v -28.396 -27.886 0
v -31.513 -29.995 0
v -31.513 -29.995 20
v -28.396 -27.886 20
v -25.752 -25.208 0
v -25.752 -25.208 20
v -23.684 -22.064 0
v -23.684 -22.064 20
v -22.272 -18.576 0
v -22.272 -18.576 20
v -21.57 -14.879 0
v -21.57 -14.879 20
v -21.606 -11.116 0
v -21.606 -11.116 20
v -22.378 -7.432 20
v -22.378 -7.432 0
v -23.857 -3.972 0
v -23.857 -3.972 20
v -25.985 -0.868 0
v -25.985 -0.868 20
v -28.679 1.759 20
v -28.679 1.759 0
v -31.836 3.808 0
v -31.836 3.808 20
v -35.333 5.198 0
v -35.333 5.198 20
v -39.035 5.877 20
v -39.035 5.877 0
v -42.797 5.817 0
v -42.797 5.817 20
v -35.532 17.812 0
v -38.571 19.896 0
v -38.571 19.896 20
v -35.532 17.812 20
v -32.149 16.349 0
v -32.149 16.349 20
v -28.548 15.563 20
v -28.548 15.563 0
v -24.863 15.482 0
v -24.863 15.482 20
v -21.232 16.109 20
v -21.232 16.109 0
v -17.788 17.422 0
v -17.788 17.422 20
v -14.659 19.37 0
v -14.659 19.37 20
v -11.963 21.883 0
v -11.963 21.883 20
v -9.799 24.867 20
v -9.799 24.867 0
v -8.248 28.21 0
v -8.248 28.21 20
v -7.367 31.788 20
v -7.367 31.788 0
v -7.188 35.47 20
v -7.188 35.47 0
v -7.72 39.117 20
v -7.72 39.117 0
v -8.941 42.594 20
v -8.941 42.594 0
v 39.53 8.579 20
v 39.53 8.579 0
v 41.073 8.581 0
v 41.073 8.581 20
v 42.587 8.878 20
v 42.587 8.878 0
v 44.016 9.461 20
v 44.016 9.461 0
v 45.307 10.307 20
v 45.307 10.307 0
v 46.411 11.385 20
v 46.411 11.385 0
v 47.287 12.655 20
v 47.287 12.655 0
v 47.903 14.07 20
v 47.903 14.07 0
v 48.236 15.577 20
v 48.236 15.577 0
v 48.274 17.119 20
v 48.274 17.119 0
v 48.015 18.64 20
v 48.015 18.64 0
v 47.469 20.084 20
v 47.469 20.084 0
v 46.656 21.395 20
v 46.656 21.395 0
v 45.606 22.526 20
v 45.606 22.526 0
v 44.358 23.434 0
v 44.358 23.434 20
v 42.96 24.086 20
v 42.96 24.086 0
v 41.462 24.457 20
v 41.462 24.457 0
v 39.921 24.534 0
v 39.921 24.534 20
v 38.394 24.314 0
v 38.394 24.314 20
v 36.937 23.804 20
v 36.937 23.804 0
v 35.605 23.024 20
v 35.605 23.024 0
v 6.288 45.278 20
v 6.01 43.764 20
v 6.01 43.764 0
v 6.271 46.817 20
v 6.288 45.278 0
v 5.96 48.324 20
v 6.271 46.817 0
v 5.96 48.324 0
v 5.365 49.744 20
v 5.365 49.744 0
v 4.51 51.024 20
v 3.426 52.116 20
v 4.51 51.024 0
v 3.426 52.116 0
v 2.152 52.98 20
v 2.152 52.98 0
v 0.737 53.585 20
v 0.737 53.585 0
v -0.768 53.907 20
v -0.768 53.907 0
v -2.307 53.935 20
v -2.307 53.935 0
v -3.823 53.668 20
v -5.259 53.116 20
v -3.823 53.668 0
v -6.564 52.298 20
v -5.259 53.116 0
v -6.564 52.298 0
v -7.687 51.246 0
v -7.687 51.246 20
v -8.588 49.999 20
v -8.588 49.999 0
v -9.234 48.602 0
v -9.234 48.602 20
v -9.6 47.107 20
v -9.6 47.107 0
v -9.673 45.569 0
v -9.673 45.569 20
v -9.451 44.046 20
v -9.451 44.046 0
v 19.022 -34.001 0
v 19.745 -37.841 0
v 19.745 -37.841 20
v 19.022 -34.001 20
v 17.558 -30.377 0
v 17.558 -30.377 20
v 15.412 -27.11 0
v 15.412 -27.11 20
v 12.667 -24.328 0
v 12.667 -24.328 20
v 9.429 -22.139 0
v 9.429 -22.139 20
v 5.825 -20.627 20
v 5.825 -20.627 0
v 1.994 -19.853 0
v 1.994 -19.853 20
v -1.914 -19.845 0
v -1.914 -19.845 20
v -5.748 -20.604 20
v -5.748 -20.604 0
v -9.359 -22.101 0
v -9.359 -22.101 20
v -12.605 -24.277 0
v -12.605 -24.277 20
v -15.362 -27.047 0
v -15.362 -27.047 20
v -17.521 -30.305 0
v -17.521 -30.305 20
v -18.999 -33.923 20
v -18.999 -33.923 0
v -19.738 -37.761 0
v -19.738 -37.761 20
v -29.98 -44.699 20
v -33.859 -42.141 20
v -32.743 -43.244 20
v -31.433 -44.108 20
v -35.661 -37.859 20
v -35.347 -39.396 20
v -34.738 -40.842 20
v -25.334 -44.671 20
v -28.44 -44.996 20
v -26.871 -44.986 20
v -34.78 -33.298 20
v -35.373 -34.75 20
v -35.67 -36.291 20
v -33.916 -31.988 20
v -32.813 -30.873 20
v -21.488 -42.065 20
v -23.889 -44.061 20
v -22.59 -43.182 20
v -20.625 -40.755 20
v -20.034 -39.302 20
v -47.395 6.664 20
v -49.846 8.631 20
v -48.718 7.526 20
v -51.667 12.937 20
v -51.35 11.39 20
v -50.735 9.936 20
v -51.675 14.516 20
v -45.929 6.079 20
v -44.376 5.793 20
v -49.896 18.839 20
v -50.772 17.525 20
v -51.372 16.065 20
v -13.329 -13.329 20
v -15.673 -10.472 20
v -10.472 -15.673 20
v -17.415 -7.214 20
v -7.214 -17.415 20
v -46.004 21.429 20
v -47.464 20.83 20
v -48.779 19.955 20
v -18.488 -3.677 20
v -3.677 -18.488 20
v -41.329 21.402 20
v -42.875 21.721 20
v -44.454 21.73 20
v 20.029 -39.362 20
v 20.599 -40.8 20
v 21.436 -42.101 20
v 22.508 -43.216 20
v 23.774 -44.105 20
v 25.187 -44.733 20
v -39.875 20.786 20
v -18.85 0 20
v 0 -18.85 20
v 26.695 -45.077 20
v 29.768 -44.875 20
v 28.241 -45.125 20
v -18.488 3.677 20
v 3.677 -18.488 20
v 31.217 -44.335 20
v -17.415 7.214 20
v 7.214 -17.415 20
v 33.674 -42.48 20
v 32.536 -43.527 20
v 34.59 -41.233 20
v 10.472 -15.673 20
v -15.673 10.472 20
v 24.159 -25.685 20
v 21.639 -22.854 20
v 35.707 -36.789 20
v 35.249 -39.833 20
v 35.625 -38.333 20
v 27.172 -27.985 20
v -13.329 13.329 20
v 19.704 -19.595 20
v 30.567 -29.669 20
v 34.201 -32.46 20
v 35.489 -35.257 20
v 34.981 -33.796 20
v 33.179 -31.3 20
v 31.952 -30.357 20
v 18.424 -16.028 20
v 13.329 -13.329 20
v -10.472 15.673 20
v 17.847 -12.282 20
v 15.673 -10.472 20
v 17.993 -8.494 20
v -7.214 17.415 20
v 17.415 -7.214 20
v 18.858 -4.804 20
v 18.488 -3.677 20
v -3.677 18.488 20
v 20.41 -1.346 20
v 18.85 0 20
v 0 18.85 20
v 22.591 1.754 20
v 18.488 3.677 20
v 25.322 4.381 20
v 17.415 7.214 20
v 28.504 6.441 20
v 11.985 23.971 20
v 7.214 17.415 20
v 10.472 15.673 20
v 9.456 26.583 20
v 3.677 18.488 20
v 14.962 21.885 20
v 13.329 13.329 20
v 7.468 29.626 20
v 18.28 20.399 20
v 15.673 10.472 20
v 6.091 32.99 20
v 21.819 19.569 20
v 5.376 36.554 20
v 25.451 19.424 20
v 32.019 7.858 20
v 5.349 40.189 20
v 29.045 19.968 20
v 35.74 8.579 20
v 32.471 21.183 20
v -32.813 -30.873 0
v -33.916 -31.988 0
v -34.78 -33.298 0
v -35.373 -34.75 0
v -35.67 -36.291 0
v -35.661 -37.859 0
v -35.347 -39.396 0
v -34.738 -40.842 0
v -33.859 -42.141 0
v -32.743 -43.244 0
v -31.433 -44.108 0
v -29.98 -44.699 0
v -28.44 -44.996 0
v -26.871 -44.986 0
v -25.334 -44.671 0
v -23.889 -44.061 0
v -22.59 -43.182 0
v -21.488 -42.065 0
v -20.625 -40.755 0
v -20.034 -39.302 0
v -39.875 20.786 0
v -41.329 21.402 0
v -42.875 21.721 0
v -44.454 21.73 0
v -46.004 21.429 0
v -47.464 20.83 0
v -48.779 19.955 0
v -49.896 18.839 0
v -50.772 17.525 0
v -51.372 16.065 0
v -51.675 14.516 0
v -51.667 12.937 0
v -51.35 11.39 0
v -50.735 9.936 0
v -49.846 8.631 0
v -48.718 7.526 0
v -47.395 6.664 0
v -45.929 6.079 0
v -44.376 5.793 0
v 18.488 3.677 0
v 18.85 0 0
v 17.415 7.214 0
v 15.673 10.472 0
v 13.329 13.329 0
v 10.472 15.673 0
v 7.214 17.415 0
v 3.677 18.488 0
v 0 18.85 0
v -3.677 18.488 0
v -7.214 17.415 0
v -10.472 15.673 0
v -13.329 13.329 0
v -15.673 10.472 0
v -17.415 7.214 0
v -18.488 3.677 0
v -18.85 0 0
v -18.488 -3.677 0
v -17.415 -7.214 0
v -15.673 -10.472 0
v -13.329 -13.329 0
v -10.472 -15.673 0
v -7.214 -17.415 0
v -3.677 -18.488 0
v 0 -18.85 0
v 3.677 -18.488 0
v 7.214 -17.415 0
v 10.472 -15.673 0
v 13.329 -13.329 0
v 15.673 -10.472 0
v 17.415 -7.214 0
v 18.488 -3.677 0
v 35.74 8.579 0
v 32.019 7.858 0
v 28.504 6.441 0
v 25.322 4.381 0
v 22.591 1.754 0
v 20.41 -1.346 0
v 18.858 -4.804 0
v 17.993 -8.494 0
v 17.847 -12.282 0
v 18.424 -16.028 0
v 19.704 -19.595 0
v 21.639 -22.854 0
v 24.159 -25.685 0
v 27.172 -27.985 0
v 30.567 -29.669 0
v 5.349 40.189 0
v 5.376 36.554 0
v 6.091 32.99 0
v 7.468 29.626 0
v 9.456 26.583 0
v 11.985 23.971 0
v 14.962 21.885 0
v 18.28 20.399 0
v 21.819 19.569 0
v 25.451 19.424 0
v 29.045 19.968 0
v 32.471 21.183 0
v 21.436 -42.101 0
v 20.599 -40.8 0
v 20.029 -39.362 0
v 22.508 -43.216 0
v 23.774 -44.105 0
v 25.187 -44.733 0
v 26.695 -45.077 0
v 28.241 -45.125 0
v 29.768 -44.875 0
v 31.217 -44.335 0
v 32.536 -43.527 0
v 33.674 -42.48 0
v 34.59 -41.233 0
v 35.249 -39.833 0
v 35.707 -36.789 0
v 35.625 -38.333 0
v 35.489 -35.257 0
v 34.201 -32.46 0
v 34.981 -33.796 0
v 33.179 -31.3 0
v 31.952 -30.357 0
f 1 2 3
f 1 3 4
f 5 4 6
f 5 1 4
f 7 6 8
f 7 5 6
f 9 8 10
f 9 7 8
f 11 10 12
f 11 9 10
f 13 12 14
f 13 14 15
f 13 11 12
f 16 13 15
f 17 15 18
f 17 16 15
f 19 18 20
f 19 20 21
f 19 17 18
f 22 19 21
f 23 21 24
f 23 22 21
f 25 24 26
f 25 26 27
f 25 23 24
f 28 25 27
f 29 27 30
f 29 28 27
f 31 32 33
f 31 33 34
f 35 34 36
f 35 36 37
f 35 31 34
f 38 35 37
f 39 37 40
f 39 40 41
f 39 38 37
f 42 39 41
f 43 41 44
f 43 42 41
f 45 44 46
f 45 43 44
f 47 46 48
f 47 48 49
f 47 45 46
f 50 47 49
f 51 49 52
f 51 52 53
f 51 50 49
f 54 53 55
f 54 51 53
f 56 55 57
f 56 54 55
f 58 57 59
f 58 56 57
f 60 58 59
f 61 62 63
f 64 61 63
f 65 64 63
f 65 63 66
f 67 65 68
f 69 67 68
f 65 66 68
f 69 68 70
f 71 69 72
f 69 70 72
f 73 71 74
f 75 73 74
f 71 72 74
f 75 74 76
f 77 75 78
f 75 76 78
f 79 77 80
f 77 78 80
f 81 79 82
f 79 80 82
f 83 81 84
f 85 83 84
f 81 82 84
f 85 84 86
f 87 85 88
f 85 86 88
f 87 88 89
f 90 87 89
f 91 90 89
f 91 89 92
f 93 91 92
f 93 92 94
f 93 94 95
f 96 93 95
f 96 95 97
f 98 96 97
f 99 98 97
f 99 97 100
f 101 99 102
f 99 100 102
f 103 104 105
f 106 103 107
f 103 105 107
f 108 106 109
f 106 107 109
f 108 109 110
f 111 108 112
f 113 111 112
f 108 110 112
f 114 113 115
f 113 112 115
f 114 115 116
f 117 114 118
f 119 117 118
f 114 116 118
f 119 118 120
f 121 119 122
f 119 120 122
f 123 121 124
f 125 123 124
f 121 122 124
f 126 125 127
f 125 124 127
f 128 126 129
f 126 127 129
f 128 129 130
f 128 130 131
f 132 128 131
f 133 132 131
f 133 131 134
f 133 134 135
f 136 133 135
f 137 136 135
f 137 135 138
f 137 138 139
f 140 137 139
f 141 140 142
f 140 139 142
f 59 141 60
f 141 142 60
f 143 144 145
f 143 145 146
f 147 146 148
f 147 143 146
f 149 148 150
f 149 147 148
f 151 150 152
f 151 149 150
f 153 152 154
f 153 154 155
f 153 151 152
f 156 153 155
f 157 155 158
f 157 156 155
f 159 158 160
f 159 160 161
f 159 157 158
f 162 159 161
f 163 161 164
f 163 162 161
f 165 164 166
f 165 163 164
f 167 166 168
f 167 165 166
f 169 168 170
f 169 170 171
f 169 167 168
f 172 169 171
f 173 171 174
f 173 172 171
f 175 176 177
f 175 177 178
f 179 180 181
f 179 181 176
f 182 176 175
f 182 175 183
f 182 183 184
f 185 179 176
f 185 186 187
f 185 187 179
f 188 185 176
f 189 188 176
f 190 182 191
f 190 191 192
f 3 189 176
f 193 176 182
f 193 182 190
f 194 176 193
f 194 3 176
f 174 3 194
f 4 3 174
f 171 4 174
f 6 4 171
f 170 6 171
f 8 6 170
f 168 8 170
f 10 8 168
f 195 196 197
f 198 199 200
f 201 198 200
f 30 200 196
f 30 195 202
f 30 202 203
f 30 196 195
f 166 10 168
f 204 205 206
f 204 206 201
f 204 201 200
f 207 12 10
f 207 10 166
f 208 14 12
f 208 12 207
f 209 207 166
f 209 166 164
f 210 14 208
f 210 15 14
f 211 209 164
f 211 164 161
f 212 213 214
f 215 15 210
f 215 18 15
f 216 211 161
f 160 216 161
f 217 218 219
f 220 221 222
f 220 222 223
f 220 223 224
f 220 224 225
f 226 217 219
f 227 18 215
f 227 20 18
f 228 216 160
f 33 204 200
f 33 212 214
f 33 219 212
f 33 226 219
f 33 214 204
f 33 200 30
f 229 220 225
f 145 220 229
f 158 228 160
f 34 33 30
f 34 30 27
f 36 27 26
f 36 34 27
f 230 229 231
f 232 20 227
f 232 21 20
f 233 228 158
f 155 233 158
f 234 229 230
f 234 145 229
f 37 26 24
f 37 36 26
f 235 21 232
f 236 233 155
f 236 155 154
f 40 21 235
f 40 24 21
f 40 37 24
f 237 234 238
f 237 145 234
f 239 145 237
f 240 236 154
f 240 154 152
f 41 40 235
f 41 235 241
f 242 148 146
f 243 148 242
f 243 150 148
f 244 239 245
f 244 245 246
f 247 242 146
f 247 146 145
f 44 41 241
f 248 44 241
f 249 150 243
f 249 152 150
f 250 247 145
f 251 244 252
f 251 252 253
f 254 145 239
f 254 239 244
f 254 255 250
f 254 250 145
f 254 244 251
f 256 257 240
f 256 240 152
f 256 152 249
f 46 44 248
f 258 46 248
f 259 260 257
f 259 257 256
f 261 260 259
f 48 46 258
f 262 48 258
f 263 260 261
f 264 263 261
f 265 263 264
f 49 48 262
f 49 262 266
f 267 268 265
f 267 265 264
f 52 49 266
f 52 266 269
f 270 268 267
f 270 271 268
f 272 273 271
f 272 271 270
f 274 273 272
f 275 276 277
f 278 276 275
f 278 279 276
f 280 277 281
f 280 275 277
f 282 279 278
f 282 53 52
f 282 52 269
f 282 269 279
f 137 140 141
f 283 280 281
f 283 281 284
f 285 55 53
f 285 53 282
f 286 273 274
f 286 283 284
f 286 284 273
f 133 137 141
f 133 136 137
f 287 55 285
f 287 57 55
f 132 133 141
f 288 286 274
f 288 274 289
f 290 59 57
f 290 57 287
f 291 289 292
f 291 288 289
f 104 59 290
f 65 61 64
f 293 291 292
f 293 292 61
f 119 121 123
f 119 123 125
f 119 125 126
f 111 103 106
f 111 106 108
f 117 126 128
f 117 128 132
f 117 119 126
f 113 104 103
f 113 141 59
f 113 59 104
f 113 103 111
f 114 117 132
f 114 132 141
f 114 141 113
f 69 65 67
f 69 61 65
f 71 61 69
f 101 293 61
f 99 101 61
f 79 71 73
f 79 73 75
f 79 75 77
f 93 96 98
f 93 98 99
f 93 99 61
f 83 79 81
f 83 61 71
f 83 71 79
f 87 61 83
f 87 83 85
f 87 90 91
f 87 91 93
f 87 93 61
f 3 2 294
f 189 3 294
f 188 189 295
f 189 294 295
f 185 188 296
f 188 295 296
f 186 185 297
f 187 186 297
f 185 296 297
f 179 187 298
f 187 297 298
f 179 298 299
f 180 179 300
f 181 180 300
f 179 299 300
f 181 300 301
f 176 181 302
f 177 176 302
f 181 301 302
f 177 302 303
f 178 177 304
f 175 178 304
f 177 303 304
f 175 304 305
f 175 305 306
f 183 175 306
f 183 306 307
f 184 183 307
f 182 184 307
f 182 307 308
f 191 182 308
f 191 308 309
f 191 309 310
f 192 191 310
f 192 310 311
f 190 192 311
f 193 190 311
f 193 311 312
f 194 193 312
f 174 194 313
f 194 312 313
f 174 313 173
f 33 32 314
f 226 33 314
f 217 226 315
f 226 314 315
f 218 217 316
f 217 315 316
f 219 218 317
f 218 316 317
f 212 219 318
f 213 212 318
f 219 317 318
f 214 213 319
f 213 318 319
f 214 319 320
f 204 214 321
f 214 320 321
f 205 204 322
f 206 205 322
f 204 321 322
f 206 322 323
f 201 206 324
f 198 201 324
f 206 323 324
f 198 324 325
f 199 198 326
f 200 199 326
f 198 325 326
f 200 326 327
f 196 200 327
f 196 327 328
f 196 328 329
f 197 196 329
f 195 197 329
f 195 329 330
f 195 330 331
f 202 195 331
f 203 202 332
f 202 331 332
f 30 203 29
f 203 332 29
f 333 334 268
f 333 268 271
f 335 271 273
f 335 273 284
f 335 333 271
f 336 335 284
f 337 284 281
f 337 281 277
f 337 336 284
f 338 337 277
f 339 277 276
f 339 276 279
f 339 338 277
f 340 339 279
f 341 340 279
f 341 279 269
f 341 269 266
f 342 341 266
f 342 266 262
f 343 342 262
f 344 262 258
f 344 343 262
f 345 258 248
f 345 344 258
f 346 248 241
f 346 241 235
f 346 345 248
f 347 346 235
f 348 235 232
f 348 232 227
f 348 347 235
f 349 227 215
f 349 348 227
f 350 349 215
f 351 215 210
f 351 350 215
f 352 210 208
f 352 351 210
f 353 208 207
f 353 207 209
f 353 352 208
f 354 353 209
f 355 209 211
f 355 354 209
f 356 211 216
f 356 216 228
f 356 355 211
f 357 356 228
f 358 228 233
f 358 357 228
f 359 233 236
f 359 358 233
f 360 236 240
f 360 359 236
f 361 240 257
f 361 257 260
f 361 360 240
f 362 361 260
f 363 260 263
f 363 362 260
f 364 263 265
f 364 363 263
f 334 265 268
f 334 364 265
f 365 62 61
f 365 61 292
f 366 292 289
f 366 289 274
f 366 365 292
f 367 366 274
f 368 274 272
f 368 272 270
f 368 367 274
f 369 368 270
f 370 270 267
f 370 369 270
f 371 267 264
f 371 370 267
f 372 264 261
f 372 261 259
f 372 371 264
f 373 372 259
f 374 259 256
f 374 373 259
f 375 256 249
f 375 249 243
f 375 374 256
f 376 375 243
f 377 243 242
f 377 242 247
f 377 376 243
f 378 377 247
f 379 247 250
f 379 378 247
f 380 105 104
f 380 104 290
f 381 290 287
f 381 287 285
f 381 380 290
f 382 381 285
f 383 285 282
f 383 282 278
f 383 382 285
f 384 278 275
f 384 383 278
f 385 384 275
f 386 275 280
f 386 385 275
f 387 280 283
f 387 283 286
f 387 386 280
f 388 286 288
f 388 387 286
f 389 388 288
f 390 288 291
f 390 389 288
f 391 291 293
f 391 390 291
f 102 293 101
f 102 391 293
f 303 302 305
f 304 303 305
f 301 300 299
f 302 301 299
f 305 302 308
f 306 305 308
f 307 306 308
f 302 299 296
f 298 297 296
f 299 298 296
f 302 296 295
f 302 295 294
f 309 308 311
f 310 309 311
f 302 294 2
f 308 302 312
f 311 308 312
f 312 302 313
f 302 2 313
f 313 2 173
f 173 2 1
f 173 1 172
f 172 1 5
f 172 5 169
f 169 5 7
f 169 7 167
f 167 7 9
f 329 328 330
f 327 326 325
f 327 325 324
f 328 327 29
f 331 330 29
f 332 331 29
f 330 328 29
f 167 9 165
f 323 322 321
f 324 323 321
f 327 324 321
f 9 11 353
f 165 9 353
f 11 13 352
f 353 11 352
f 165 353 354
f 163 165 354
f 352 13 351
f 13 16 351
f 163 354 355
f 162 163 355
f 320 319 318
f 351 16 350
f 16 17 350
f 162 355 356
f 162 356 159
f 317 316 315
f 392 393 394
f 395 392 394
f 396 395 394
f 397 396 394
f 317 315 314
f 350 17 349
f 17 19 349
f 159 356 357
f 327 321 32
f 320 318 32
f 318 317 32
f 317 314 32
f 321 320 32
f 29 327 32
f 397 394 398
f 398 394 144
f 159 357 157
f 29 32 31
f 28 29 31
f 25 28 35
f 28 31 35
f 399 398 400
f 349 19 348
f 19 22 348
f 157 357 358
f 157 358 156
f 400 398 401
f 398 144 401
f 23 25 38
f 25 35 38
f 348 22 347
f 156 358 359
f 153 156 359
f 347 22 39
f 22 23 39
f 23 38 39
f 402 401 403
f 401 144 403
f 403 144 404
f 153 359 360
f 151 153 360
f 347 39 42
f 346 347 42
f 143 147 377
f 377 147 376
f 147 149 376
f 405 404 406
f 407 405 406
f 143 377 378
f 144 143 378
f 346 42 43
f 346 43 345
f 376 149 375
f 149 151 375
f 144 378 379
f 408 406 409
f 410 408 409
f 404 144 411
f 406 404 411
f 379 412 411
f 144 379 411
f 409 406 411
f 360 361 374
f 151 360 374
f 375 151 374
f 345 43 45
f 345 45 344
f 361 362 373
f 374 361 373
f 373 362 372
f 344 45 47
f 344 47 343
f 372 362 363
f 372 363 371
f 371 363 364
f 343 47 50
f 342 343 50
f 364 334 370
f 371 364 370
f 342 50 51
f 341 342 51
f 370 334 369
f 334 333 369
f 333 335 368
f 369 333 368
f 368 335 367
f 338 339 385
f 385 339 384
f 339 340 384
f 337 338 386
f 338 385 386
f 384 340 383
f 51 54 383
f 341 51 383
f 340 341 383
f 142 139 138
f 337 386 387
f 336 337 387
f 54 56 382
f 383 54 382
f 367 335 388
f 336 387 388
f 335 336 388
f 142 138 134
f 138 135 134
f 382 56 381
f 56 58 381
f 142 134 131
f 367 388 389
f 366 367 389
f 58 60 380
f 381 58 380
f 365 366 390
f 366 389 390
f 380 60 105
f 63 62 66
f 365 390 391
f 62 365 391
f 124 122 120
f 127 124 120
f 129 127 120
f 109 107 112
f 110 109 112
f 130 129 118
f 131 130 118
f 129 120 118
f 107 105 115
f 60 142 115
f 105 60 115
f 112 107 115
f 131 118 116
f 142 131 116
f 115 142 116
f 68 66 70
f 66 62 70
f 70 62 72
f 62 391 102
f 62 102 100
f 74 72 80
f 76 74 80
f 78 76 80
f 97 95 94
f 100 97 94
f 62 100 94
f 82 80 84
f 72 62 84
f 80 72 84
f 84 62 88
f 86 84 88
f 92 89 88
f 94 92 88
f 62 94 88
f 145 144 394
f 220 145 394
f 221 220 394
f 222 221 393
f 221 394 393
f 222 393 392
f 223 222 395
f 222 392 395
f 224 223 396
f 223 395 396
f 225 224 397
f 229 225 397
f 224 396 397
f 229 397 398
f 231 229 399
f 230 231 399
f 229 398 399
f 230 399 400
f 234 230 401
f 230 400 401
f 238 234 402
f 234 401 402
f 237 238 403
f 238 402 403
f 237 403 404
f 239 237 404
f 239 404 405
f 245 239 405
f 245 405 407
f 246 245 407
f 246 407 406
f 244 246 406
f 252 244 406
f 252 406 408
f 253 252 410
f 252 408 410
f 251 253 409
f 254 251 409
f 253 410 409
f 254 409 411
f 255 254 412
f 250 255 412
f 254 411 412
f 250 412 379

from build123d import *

# Parameters (mm, degrees)
SKETCH_R  = 18.849926
PAD_DEPTH = 20


with BuildPart() as part:
    # Sketch → Pad (new body)
    with BuildSketch(Plane.XY):
        with BuildLine():
            ThreePointArc((6.009813, 43.763913), (-2.307048, 53.935241), (-8.940587, 42.594066))
            ThreePointArc((-38.571066, 19.895965), (-14.659471, 19.370481), (-8.940587, 42.594066))
            ThreePointArc((-38.571066, 19.895965), (-51.372493, 16.065234), (-42.79749, 5.81729))
            ThreePointArc((-31.512922, -29.994656), (-22.378417, -7.432425), (-42.79749, 5.81729))
            ThreePointArc((-31.512922, -29.994656), (-32.109292, -43.708122), (-19.737971, -37.761257))
            ThreePointArc((19.745172, -37.841497), (0.040281, -19.752175), (-19.737971, -37.761257))
            ThreePointArc((19.745172, -37.841497), (32.535801, -43.526638), (30.567408, -29.668556))
            ThreePointArc((39.530273, 8.579484), (18.337441, -6.628465), (30.567408, -29.668556))
            ThreePointArc((39.530273, 8.579484), (48.01508, 18.640488), (35.605471, 23.024247))
            ThreePointArc((6.009813, 43.763913), (13.423393, 22.856702), (35.605471, 23.024247))
        make_face()
        Circle(SKETCH_R, mode=Mode.SUBTRACT)
    extrude(amount=PAD_DEPTH)


solid = part.part
